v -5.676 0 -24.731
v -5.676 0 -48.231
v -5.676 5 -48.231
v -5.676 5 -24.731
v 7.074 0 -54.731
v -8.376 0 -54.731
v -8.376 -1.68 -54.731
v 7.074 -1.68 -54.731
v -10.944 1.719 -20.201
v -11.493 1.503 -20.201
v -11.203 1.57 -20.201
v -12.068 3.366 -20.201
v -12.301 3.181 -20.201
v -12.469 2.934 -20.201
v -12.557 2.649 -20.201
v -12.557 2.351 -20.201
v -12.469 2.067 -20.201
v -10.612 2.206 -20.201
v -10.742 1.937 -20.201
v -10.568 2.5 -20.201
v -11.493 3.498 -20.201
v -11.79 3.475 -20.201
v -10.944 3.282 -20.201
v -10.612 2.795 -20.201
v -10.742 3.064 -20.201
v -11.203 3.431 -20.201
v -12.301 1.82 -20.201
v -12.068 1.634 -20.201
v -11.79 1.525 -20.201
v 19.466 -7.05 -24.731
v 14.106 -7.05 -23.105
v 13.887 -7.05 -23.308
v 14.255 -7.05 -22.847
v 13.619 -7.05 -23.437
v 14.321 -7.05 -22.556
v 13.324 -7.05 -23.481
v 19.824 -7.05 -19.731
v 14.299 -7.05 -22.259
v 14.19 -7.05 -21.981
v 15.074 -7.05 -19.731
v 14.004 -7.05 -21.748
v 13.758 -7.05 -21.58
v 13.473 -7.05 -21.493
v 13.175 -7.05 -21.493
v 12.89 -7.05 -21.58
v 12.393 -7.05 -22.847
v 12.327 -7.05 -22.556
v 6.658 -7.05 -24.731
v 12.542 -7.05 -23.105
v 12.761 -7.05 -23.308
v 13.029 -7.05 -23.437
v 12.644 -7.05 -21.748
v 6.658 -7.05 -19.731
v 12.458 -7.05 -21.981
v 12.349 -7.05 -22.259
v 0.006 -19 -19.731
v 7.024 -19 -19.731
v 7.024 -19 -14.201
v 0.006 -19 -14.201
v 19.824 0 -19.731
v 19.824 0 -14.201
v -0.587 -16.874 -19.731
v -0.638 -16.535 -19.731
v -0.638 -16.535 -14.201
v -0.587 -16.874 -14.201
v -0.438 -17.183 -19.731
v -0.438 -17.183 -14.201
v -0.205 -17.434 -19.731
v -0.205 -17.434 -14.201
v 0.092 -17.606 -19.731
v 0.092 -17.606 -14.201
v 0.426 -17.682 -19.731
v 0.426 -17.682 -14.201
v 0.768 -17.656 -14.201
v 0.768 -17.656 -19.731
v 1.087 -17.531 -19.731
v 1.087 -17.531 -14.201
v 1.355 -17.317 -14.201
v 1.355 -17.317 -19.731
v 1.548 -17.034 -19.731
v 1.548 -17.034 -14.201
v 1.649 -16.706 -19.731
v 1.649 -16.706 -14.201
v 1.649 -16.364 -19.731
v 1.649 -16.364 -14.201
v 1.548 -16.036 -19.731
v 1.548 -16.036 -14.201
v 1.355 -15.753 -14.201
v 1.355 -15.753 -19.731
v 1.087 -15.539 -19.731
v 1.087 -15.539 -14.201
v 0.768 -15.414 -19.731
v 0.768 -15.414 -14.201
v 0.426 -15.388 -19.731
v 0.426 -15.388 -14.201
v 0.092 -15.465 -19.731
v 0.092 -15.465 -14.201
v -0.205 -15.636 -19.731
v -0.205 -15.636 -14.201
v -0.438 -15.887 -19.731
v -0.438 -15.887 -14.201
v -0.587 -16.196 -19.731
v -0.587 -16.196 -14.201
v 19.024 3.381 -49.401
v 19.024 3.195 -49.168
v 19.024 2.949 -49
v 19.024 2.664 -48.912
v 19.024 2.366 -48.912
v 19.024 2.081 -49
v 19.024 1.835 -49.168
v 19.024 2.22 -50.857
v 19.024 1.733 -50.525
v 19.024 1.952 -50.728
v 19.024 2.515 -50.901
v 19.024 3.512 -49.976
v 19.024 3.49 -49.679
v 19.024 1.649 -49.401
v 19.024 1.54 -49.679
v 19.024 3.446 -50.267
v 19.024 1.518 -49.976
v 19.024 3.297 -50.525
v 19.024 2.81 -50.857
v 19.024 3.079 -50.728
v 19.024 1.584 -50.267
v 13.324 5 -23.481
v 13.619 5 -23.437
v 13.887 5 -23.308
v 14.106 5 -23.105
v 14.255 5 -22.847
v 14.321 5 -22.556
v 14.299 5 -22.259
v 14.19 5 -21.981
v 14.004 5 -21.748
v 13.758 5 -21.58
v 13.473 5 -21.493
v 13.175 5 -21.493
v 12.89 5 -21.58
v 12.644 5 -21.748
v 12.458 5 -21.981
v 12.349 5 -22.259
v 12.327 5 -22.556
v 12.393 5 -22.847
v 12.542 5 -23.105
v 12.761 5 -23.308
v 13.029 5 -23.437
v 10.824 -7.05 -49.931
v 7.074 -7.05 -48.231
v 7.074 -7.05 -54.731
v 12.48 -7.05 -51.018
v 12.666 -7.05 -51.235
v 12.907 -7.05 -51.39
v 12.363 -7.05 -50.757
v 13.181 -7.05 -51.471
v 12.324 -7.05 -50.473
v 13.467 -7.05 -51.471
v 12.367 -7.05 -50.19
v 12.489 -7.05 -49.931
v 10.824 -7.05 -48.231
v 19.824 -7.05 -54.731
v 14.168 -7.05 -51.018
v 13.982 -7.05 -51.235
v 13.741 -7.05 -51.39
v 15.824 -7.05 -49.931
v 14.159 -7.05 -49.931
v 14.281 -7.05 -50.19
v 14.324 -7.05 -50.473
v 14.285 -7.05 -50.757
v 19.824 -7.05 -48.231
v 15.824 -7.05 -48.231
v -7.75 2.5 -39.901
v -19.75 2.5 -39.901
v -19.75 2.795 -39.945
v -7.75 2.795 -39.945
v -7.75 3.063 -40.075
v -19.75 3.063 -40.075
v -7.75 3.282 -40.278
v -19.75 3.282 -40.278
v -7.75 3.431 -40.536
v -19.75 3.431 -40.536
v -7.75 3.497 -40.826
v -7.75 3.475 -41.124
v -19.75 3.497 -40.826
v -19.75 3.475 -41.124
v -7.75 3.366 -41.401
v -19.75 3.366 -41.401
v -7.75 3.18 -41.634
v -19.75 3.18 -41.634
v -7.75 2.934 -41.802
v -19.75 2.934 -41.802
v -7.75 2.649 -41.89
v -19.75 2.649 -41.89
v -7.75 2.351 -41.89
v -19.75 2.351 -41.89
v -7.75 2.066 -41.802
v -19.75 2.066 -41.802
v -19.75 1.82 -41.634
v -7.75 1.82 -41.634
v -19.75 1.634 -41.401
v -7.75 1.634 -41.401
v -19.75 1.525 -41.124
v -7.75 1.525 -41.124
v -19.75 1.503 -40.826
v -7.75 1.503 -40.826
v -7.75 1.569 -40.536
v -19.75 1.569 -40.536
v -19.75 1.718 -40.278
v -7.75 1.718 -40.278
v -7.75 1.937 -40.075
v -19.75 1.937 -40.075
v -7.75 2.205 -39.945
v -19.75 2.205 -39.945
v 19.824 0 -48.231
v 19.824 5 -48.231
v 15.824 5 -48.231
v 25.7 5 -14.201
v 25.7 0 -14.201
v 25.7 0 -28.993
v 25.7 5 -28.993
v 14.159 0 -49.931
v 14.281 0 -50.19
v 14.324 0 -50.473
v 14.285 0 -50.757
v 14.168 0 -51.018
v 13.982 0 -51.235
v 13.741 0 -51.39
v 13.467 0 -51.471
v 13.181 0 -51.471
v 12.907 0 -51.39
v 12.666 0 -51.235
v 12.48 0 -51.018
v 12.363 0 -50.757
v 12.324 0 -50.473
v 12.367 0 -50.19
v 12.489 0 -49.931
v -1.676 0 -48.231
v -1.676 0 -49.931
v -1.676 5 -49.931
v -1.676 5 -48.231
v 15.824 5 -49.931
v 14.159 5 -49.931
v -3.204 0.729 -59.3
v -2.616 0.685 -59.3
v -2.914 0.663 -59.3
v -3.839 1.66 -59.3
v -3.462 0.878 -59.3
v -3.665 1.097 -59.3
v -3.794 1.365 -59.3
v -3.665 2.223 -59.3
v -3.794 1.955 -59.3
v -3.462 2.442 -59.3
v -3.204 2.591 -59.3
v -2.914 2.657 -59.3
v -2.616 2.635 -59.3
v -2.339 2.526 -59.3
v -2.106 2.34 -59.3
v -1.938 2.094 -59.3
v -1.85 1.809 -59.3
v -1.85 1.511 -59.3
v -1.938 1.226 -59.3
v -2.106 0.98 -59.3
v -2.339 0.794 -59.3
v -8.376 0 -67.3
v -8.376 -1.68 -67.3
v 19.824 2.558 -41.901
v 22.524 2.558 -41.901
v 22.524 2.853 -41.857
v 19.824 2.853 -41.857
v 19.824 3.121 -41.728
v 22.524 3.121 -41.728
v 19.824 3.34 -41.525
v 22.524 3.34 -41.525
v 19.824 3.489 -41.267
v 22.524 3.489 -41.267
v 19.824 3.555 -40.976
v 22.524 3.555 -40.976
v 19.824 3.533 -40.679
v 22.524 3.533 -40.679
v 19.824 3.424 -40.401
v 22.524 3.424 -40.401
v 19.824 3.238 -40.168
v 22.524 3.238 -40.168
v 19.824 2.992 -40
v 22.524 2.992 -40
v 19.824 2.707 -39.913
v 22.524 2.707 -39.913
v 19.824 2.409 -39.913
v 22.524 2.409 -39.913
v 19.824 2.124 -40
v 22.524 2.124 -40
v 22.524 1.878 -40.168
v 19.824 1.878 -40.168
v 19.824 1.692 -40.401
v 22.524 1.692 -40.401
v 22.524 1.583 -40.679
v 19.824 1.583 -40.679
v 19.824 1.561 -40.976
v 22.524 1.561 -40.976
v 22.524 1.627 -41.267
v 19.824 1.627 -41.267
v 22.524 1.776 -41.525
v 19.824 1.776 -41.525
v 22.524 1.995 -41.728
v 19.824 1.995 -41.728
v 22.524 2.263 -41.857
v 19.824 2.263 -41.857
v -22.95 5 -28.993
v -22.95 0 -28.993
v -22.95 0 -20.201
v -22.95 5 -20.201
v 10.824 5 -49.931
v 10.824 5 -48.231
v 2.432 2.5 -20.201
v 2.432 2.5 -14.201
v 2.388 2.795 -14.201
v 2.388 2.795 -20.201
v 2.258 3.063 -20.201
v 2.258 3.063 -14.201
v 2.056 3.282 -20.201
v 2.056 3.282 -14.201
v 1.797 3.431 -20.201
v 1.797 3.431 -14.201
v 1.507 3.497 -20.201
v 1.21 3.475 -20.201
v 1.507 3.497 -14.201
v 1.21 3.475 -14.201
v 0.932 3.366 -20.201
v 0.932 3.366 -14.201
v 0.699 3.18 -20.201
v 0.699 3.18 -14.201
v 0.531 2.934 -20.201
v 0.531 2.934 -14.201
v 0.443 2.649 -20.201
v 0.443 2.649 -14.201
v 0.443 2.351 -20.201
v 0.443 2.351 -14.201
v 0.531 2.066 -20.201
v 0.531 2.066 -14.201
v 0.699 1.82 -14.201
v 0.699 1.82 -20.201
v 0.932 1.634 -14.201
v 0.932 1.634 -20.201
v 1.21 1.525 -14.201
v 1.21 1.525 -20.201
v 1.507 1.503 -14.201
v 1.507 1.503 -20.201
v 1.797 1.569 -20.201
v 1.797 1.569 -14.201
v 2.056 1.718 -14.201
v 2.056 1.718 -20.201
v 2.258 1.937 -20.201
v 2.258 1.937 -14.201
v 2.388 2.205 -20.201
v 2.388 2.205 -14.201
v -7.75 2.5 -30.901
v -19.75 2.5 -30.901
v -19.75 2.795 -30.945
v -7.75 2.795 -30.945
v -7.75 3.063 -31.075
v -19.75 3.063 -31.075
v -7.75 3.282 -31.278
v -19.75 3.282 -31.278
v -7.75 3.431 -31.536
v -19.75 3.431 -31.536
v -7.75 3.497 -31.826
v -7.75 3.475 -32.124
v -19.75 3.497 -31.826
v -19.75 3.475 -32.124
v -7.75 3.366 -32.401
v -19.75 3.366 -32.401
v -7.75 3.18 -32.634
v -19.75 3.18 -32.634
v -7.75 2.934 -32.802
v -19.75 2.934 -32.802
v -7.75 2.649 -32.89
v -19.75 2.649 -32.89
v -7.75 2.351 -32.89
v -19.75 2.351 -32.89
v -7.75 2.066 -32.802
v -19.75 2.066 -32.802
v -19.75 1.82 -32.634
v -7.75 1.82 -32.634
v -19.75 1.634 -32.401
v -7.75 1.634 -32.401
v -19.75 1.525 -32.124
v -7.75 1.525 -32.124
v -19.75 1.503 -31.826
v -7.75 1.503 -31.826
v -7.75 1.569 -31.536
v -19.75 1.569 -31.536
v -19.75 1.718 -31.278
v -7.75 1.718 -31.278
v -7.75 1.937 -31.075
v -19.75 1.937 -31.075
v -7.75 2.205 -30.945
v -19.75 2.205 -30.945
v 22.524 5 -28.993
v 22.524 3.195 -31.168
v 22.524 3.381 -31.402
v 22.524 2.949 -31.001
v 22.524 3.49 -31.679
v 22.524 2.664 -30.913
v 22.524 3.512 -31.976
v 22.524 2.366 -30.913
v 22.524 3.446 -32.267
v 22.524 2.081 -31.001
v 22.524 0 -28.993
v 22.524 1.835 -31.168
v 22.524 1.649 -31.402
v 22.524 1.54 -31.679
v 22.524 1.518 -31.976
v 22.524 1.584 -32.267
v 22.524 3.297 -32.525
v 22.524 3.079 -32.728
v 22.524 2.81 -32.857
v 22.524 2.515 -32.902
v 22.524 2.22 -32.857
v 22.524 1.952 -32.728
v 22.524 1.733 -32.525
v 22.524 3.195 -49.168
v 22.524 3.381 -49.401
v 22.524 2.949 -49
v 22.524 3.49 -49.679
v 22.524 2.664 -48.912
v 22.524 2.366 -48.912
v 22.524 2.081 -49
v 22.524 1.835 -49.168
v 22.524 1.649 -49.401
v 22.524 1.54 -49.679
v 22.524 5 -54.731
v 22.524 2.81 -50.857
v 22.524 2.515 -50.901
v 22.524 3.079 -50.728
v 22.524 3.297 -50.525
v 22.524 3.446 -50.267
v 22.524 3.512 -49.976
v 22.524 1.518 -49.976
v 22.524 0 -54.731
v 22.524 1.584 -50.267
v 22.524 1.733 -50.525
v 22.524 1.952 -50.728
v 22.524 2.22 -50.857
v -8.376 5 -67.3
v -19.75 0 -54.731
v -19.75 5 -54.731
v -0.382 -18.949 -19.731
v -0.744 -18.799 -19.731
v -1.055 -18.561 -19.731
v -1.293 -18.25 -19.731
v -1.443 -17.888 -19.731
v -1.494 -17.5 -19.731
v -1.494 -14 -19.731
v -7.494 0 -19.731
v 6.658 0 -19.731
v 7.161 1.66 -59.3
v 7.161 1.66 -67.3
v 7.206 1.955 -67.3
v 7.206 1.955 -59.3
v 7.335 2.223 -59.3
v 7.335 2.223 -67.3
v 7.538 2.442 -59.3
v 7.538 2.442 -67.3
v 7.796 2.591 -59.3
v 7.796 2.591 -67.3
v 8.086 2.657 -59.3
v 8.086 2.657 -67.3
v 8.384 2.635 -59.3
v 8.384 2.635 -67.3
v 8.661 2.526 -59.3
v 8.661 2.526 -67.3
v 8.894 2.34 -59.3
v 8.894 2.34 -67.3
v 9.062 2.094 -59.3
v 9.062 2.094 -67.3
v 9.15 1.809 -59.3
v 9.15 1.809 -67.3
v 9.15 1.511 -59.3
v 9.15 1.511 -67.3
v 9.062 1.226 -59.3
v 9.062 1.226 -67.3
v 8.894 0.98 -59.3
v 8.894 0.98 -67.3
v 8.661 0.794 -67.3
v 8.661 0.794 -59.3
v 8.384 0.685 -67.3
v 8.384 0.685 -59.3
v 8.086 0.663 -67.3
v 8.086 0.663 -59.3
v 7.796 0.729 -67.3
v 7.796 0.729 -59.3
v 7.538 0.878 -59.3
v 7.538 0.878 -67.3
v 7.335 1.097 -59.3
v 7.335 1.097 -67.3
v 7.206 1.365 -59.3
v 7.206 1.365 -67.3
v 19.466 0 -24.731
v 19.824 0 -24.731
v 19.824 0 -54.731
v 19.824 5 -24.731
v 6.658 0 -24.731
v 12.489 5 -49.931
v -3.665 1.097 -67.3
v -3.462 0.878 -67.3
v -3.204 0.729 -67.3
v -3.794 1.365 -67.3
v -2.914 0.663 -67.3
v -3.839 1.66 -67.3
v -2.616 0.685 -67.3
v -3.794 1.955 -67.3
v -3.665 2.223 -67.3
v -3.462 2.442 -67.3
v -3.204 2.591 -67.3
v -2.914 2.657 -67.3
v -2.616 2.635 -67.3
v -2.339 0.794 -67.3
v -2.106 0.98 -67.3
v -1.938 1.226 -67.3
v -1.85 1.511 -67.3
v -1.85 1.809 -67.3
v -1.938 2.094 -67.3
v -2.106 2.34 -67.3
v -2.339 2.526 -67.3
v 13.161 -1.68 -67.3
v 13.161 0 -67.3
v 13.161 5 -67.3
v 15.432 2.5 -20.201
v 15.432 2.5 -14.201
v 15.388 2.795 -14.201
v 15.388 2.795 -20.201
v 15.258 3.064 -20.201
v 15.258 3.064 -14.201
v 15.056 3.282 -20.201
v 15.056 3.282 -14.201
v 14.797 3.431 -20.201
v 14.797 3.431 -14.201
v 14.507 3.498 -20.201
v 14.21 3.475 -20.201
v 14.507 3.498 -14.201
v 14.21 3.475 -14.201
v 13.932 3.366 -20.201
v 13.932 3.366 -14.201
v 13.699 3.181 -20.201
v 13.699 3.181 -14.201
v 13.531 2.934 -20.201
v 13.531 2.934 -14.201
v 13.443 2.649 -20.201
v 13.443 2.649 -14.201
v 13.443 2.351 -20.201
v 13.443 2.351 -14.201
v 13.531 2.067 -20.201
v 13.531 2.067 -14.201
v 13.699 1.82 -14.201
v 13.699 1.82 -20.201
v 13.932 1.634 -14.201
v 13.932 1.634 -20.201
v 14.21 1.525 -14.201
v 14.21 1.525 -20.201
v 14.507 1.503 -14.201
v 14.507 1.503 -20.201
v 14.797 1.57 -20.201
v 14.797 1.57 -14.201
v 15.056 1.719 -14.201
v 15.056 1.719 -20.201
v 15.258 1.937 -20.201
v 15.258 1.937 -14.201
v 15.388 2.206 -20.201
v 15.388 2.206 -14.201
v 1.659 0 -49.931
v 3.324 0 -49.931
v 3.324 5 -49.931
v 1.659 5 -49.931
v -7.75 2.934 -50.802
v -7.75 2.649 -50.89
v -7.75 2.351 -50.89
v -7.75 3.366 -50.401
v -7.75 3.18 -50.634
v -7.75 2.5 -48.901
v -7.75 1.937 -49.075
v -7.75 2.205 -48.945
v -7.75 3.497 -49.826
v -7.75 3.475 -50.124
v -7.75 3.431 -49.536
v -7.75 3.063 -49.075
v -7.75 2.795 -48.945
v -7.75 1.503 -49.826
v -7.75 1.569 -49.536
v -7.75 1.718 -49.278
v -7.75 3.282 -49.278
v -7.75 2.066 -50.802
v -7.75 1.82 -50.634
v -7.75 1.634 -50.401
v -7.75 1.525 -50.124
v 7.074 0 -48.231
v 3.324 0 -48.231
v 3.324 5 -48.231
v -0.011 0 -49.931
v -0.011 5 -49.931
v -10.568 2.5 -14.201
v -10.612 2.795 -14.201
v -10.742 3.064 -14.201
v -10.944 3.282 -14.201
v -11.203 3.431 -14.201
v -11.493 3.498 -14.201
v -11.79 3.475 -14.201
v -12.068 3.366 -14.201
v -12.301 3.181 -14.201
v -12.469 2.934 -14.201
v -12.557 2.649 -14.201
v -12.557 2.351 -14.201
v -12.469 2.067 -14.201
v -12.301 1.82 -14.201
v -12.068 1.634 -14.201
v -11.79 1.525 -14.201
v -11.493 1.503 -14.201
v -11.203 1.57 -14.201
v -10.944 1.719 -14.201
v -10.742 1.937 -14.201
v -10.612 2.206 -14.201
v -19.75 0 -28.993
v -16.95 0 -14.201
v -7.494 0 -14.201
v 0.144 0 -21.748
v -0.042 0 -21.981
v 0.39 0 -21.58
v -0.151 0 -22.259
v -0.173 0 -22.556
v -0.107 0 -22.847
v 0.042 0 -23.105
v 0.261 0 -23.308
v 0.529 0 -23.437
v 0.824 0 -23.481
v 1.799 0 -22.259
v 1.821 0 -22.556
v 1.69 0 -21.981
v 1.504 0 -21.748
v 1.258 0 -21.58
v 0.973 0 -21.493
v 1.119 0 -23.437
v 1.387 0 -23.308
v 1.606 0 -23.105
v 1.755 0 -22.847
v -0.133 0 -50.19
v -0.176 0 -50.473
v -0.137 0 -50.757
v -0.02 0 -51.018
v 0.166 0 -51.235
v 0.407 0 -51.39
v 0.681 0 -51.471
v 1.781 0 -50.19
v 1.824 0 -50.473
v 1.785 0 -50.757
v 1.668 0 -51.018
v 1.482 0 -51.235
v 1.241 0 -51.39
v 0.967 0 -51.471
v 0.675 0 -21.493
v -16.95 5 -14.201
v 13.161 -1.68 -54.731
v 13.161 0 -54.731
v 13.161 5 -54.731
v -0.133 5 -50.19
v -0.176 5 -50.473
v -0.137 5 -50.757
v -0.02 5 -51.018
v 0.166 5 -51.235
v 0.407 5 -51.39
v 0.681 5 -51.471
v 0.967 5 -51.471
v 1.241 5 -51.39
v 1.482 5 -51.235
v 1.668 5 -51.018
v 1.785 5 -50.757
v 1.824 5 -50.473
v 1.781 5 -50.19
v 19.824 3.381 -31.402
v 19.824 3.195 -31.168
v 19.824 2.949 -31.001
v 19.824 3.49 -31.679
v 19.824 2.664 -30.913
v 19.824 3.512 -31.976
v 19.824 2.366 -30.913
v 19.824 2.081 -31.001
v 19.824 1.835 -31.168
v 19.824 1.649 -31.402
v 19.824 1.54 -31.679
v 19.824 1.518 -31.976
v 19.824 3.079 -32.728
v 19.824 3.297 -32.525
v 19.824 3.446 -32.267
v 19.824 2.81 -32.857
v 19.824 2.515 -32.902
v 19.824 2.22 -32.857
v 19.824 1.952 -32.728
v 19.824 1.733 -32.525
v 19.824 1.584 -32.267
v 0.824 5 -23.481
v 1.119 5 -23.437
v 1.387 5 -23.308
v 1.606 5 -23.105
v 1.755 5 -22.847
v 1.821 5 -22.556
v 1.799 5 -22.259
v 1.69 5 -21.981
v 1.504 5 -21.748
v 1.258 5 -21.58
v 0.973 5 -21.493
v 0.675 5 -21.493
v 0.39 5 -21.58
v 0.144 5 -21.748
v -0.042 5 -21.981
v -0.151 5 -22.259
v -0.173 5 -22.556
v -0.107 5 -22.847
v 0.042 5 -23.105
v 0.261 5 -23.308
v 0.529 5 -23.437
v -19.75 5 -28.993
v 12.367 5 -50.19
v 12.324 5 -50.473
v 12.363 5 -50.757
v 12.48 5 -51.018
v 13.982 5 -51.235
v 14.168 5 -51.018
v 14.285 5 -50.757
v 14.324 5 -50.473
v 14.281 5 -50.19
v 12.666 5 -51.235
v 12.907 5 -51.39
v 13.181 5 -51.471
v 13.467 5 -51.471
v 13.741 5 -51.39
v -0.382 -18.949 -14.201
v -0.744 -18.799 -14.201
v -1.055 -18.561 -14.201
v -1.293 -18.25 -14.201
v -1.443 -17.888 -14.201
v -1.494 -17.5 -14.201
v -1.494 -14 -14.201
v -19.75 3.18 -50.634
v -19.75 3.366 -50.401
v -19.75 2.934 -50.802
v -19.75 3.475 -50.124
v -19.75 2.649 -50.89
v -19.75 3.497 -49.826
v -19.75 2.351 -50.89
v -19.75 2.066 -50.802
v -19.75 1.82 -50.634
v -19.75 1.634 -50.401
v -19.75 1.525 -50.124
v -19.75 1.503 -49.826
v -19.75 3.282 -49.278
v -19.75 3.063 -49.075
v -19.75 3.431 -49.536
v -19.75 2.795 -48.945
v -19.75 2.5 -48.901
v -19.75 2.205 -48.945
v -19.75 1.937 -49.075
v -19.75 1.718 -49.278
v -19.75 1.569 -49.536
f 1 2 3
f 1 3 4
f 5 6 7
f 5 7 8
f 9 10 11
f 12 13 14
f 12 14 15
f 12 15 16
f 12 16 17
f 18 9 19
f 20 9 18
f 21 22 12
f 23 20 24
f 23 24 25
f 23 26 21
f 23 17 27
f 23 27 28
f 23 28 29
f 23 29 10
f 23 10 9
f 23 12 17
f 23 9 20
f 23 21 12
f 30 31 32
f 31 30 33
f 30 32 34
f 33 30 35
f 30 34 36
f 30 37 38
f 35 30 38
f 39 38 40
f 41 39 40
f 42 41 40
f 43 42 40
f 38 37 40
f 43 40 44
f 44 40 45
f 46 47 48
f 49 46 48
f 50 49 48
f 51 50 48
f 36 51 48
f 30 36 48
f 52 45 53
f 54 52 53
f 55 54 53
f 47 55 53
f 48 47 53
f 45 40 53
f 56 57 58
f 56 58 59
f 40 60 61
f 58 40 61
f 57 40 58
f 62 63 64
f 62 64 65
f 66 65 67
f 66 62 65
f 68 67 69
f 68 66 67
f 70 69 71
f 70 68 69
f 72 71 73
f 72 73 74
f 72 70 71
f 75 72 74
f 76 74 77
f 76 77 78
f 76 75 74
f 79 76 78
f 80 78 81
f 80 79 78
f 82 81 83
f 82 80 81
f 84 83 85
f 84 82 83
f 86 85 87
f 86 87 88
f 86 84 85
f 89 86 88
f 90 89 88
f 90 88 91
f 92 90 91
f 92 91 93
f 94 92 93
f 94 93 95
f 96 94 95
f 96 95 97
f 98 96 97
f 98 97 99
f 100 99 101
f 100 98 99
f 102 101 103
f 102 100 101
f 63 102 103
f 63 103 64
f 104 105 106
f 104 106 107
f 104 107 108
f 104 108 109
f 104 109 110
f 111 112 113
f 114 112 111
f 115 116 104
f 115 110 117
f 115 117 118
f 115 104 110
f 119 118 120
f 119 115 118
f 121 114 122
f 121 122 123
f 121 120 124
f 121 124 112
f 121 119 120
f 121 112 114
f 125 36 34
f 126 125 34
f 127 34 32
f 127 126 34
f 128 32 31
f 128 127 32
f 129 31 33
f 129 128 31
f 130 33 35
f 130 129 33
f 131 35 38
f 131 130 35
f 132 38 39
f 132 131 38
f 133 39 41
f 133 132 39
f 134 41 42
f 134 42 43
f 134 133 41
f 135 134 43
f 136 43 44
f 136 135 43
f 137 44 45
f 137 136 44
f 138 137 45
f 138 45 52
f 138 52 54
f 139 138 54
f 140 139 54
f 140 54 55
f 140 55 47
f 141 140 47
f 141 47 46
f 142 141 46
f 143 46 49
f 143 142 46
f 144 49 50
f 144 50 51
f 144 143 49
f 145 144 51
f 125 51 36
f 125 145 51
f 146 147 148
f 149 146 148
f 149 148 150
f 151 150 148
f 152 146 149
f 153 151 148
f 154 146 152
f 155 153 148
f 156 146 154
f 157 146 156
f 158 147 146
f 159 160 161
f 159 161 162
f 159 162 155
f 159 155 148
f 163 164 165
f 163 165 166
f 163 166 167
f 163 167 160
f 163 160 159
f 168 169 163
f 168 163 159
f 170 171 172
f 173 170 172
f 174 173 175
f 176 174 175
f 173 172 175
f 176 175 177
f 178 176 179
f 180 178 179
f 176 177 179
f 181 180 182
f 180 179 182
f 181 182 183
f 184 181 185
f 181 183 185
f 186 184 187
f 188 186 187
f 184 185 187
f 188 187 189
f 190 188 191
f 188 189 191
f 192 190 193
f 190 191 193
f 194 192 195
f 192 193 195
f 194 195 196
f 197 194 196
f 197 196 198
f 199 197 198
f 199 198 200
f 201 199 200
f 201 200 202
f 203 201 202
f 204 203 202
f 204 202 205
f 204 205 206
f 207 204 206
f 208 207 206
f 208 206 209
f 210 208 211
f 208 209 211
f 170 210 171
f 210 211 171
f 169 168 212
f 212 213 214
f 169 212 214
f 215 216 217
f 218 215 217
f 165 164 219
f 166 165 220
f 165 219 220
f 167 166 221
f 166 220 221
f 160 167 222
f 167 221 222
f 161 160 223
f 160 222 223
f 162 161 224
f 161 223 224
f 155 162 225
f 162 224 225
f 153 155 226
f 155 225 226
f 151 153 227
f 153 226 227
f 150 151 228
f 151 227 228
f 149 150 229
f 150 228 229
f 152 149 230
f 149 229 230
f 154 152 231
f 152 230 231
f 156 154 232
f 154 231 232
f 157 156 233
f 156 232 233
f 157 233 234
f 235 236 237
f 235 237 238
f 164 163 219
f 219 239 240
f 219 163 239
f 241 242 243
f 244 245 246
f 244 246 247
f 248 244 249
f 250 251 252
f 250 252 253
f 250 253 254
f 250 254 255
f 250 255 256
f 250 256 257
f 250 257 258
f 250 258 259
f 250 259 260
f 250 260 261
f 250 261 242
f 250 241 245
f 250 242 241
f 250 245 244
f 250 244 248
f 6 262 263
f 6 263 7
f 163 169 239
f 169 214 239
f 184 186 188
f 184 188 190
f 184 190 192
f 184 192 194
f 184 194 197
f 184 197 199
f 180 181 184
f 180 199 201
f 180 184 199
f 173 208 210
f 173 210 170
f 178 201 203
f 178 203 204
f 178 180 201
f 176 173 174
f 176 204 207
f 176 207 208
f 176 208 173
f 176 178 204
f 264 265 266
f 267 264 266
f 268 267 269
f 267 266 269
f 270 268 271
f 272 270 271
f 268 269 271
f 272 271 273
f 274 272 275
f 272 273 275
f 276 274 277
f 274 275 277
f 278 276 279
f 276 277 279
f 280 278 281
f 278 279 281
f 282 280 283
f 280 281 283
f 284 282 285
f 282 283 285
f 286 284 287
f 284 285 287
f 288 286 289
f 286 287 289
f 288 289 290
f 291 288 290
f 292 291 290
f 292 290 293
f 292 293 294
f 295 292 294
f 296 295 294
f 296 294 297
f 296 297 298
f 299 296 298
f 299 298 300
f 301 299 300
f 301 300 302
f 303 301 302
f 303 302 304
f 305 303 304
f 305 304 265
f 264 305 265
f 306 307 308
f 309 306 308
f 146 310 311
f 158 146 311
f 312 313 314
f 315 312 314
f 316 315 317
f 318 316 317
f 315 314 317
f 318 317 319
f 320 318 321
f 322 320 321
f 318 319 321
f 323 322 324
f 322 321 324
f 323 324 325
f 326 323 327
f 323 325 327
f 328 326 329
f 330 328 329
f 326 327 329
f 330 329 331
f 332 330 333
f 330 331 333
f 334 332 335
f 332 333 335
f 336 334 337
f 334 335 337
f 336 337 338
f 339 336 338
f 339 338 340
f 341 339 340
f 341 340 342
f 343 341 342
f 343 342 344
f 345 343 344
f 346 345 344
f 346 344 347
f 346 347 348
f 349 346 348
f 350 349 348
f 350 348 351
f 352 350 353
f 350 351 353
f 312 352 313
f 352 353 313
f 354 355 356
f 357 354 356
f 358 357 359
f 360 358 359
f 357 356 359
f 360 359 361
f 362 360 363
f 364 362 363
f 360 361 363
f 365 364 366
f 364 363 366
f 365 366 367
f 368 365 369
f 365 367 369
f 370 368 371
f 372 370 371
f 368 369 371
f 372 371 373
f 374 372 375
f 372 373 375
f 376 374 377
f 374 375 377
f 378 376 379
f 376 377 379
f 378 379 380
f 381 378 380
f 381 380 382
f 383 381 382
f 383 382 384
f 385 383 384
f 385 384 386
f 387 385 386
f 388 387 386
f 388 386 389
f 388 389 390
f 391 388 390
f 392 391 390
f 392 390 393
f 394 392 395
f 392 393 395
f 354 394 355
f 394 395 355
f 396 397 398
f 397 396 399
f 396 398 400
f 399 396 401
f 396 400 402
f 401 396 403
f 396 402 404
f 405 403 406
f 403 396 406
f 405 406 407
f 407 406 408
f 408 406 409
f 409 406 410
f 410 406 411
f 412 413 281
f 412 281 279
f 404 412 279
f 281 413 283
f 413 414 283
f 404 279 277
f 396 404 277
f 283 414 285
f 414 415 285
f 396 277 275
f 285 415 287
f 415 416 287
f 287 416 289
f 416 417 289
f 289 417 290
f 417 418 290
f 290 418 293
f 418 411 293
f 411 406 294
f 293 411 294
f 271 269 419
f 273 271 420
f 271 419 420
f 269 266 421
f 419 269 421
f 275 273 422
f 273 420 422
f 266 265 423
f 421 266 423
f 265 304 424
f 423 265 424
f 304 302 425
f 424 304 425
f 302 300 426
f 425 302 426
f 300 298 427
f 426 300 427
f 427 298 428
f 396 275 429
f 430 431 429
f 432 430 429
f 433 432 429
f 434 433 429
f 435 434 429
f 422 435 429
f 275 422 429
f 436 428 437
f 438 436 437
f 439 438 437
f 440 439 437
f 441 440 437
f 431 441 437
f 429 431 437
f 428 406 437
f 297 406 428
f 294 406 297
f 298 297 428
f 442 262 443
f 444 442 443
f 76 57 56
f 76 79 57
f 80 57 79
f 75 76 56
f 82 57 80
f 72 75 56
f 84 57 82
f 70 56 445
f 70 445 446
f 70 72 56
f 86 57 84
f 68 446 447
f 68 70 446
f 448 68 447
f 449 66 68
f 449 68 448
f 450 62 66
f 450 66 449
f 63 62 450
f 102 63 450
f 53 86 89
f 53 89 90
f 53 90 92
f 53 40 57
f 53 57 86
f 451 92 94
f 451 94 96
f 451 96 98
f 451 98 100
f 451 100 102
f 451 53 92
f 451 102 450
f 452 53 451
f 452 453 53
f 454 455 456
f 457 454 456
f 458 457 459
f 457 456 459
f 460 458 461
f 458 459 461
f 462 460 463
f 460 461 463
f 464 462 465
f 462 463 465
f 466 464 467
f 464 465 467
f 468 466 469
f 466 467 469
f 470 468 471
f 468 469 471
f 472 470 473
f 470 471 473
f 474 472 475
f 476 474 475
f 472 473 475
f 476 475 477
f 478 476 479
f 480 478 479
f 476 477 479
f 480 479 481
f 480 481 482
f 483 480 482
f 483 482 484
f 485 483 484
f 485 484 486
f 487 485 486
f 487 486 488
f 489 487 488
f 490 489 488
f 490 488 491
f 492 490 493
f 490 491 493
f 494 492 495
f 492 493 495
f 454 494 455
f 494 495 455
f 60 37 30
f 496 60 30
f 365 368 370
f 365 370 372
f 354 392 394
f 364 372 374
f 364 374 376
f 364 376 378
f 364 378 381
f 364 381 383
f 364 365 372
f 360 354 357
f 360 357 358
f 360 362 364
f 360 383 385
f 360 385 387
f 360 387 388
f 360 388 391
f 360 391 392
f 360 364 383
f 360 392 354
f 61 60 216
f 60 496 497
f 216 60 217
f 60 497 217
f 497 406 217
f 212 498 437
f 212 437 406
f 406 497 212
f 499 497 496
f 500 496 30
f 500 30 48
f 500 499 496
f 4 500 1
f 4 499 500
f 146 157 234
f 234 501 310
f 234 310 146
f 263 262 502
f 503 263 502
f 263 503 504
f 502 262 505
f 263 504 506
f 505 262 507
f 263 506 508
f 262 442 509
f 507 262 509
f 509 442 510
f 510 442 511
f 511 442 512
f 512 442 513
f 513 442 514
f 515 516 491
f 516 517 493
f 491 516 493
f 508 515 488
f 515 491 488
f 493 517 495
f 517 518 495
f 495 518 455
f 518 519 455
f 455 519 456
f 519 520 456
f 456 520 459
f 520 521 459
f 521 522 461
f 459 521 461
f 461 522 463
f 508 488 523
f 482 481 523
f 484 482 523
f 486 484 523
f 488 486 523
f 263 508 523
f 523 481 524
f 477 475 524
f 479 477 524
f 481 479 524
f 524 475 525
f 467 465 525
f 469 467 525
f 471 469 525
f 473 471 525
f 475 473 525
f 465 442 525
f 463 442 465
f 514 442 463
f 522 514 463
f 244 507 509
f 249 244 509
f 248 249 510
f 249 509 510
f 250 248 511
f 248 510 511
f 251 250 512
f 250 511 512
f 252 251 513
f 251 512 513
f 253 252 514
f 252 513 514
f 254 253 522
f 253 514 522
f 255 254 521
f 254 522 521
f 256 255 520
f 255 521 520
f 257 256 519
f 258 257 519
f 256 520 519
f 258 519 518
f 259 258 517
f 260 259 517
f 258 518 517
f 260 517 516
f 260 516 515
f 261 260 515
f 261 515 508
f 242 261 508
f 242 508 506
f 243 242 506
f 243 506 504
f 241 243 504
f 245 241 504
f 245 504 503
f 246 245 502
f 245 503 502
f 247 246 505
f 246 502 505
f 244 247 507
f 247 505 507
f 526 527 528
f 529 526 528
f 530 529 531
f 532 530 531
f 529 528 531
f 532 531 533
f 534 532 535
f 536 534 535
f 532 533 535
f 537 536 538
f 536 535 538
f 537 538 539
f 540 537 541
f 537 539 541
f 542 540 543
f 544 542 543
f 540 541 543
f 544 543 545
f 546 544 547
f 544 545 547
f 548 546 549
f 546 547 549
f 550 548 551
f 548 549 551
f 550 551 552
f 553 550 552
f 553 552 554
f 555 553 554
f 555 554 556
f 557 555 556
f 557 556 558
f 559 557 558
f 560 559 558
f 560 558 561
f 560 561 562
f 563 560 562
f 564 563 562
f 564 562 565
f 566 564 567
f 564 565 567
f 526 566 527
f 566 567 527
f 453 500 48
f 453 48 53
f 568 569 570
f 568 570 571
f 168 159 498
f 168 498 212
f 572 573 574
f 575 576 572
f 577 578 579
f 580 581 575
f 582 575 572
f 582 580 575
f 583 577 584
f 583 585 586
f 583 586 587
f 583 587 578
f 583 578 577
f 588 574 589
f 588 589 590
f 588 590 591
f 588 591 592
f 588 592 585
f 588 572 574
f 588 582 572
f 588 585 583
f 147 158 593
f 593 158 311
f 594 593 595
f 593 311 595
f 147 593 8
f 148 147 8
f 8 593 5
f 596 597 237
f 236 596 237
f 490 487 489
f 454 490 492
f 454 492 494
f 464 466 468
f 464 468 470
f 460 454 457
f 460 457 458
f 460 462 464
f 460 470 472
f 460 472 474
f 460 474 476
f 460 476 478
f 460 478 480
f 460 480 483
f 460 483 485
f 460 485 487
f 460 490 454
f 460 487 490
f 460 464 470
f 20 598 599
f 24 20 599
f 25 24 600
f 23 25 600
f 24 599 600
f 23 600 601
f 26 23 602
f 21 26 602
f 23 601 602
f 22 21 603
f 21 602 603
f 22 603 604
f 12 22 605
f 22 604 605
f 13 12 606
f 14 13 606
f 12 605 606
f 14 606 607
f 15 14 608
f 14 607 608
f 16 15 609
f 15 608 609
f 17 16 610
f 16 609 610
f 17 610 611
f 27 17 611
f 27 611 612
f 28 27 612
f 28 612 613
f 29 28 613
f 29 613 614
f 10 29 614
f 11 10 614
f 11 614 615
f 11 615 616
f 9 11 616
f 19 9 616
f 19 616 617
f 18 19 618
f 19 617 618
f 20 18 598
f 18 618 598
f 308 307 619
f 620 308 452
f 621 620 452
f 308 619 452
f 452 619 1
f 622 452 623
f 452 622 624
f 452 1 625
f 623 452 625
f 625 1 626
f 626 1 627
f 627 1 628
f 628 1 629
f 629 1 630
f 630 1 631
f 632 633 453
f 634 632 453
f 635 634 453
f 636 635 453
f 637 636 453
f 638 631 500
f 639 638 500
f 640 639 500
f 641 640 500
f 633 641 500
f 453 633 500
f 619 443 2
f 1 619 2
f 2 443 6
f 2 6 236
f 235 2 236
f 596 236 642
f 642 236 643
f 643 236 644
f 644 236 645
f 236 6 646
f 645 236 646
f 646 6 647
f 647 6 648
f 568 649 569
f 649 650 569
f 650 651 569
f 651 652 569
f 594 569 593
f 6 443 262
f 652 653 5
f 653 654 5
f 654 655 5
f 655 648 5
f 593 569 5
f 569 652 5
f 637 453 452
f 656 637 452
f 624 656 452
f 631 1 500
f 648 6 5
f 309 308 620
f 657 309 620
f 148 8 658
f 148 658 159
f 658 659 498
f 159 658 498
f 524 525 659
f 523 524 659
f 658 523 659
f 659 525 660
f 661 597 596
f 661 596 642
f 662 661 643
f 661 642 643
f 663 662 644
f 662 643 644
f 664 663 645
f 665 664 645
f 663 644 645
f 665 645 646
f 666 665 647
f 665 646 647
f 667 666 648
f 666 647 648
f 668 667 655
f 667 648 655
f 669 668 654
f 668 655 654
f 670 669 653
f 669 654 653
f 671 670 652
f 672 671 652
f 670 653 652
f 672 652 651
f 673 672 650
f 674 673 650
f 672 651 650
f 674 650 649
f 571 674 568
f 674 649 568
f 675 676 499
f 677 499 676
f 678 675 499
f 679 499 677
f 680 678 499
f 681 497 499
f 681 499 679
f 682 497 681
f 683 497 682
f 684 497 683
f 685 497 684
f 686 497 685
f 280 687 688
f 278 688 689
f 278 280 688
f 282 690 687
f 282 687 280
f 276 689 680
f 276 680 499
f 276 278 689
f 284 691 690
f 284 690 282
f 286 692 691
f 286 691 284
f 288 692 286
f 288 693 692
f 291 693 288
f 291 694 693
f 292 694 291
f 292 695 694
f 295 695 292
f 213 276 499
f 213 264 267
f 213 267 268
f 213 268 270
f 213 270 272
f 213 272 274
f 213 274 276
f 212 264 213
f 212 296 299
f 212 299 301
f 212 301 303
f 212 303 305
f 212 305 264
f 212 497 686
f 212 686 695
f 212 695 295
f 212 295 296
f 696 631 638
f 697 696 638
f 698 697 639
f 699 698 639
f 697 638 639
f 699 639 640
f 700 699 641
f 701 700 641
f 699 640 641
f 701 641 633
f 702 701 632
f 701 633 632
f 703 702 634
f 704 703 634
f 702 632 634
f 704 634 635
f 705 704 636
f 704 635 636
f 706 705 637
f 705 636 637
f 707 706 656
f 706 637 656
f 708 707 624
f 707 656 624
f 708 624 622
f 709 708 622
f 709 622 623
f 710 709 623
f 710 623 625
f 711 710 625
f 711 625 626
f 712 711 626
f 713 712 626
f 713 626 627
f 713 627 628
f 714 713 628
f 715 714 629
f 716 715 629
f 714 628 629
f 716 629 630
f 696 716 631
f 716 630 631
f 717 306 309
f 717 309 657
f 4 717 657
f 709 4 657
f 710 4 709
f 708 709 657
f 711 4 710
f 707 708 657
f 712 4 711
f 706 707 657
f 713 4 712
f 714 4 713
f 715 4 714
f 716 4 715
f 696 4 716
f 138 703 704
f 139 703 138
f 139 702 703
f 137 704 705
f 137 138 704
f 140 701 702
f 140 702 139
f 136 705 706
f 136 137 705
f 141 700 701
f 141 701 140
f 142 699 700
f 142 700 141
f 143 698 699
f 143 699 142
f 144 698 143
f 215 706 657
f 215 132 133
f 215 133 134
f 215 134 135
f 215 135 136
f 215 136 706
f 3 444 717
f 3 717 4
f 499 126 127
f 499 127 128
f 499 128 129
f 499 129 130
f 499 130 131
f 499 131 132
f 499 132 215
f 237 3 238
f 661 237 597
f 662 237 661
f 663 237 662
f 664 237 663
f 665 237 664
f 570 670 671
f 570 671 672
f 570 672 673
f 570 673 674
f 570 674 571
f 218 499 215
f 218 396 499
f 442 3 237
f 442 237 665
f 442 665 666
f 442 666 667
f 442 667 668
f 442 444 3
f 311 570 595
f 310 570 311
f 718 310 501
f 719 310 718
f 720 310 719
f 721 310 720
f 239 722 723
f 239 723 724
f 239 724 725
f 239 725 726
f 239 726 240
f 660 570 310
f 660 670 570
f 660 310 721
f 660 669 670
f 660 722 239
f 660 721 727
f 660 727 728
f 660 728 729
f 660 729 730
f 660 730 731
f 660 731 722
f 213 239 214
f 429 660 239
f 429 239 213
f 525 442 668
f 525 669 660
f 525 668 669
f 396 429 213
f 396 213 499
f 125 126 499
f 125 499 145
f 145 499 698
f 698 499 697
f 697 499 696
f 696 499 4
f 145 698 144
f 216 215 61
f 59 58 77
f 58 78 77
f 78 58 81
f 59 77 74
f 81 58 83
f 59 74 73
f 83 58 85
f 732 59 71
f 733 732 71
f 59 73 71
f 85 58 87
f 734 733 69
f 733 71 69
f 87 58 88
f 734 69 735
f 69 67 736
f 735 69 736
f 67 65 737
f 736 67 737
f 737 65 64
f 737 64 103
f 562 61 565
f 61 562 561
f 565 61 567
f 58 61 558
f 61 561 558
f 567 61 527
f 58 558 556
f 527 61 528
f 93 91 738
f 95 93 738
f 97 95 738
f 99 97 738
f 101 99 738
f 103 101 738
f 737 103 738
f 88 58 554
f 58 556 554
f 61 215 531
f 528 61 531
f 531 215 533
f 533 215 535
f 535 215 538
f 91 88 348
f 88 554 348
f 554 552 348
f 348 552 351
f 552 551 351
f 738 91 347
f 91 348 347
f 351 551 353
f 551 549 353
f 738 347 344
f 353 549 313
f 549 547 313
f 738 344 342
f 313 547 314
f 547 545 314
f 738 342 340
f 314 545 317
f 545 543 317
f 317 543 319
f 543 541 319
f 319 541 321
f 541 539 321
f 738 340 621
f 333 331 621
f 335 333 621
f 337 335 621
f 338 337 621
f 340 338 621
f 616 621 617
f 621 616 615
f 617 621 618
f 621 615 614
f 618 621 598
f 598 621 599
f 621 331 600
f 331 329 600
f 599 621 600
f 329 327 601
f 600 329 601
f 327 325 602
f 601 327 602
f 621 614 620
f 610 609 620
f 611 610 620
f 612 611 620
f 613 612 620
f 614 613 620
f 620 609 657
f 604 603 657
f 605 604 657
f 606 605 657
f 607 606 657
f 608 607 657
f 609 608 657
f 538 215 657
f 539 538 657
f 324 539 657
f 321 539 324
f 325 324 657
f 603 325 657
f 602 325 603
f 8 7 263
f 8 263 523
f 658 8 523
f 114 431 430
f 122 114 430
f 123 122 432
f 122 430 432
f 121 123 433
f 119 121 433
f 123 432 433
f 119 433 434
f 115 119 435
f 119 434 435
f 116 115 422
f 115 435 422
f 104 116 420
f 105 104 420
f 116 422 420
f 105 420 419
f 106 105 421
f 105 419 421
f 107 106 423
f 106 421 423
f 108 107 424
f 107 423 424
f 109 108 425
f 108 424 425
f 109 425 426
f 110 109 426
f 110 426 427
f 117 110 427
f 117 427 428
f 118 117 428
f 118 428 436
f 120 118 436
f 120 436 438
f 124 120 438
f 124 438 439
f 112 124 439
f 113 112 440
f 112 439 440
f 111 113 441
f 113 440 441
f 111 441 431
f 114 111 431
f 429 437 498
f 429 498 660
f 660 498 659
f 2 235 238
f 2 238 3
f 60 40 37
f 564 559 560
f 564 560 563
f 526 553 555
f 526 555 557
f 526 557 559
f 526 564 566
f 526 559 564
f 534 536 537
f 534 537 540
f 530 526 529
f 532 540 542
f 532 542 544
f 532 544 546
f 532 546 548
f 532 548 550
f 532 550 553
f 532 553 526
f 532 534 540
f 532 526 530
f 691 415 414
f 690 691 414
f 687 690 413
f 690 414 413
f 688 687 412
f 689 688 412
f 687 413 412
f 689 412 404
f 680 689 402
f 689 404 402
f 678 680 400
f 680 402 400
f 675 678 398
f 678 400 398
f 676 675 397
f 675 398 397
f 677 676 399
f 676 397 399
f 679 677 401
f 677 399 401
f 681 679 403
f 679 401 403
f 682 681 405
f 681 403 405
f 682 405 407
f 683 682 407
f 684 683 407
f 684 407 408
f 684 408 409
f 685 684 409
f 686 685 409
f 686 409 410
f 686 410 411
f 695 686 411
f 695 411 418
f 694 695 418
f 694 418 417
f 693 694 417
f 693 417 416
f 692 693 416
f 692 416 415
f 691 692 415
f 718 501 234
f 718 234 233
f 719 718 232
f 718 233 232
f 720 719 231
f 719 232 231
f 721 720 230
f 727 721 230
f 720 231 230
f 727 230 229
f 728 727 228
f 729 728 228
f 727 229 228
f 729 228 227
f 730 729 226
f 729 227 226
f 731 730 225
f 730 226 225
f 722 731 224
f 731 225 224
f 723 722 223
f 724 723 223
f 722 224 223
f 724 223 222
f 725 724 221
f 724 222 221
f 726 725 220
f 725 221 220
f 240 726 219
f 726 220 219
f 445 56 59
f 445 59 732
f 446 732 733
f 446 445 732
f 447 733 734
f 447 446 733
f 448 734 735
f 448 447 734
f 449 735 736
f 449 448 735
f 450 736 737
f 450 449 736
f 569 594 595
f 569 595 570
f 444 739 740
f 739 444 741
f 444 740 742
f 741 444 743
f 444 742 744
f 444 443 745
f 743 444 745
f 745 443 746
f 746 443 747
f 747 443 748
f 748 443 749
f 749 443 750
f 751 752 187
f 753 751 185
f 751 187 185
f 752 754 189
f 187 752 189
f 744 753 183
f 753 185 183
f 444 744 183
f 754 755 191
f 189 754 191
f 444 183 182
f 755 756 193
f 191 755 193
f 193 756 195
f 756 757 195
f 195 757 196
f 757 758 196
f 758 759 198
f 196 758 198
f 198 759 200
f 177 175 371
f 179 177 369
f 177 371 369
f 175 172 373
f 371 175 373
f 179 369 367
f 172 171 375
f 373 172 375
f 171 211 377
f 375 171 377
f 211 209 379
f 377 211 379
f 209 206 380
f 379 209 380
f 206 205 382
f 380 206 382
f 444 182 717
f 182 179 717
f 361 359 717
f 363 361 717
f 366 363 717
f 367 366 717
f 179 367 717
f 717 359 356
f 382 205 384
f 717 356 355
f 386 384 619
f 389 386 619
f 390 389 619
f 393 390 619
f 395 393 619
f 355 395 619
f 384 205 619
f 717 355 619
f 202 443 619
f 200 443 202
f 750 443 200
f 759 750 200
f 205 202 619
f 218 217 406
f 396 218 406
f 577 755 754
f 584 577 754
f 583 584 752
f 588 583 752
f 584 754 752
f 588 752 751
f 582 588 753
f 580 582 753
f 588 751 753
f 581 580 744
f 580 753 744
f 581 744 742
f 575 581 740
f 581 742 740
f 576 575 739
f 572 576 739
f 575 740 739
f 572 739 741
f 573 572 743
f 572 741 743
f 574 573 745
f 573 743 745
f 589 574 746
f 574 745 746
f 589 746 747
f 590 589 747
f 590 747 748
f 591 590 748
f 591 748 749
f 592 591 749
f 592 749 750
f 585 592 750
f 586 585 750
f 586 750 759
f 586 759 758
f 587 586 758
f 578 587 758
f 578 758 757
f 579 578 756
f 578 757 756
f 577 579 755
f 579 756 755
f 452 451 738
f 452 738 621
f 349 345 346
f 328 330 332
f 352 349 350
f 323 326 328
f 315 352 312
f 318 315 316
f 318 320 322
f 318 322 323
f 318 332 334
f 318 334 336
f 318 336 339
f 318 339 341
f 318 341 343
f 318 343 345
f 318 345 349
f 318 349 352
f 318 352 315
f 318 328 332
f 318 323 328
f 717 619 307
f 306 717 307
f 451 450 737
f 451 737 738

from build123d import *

# Parameters (mm, degrees)
EXTRUDE_1_DEPTH     = 5
SKETCH_4_R          = 0.999999968
SKETCH_4_R_2        = 1.000000188
CUT_EXTRUDE_1_DEPTH = 5
SKETCH_6_R          = 1.000000276
SKETCH_6_R_2        = 0.999999818
CUT_EXTRUDE_2_DEPTH = 5
SKETCH_13_R         = 1.000000021
SKETCH_13_R_2       = 0.999999728
SKETCH_13_R_3       = 0.999999832
CUT_EXTRUDE_3_DEPTH = 6
SKETCH_18_R         = 1.000000534
SKETCH_18_R_2       = 1.000000046
SKETCH_18_R_3       = 0.999998785
CUT_EXTRUDE_5_DEPTH = 3.5
SKETCH_23_R         = 0.999998521
SKETCH_23_R_2       = 0.99999884
SKETCH_23_R_3       = 0.999998599
CUT_EXTRUDE_7_DEPTH = 12
EXTRUDE_5_DEPTH     = 7.05
SKETCH_26_R         = 1.000000188
EXTRUDE_5_2_DEPTH   = 7.05
SKETCH_27_W         = 21.53717804
SKETCH_27_H         = 12.569114685
EXTRUDE_6_DEPTH     = 1.68
SKETCH_28_R         = 1
CUT_EXTRUDE_8_DEPTH = 8
SKETCH_29_R         = 1.149999964
EXTRUDE_7_DEPTH     = 5.530267715


with BuildPart() as part:
    # 草图2 → 凸台-拉伸1 (new body)
    with BuildSketch(Plane(origin=(0, 0, 0), x_dir=(1, 0, 0), z_dir=(0, 1, 0))):
        Polygon((-16.950000763, 14.201086044), (25.699960709, 14.201086044), (25.699960709, 28.992816925), (22.523960114, 28.992816925), (22.523960114, 54.730998993), (13.161137581, 54.730880737), (13.161137581, 67.299995422), (-8.376040459, 67.299995422), (-19.75, 54.730998993), (-19.75, 28.992816925), (-22.950000763, 28.992816925), (-22.950000763, 20.201086044), align=None)
    extrude(amount=EXTRUDE_1_DEPTH)

    # 草图4 → 切除-拉伸1 (cut)
    with BuildSketch(Plane.XZ):
        with Locations(Location((0.823959914, -22.48135431, 0), (0, 0, 270))):
            Circle(SKETCH_4_R)
        with Locations(Location((13.323959603, -22.481354784, 0), (0, 0, 270))):
            Circle(SKETCH_4_R_2)
        Polygon((-5.676040173, -24.73135376), (19.823959351, -24.73135376), (19.823959351, -48.23135376), (15.823960304, -48.23135376), (15.823960304, -49.931354523), (10.823960304, -49.931354523), (10.823960304, -48.23135376), (3.323960066, -48.23135376), (3.323960066, -49.931354523), (-1.676040053, -49.931354523), (-1.676040053, -48.23135376), (-5.676040173, -48.23135376), align=None)
    extrude(amount=-CUT_EXTRUDE_1_DEPTH, mode=Mode.SUBTRACT)

    # 草图6 → 切除-拉伸2 (cut)
    with BuildSketch(Plane.XZ):
        with Locations((0.823959833, -50.481354106)):
            Circle(SKETCH_6_R)
        with Locations((13.323959879, -50.481354301)):
            Circle(SKETCH_6_R_2)
    extrude(amount=-CUT_EXTRUDE_2_DEPTH, mode=Mode.SUBTRACT)

    # 草图13 → 切除-拉伸3 (cut)
    with BuildSketch(Plane.XY.offset(-14.201086044)):
        with Locations((1.43202298, 2.499998854)):
            Circle(SKETCH_13_R)
        with Locations((14.432022776, 2.500426737)):
            Circle(SKETCH_13_R_2)
        with Locations((-11.56797721, 2.500425343)):
            Circle(SKETCH_13_R_3)
    extrude(amount=-CUT_EXTRUDE_3_DEPTH, mode=Mode.SUBTRACT)

    # 草图18 → 切除-拉伸5 (cut)
    with BuildSketch(Plane(origin=(22.523960114, 0, 0), x_dir=(0, 0, -1), z_dir=(1, 0, 0))):
        with Locations((31.901501235, 2.515246467)):
            Circle(SKETCH_18_R)
        with Locations((40.901397751, 2.558118146)):
            Circle(SKETCH_18_R_2)
        with Locations((49.901297308, 2.515242677)):
            Circle(SKETCH_18_R_3)
    extrude(amount=-CUT_EXTRUDE_5_DEPTH, mode=Mode.SUBTRACT)

    # 草图23 → 切除-拉伸7 (cut)
    with BuildSketch(Plane.ZY.offset(19.75)):
        with Locations((-31.900998993, 2.5)):
            Circle(SKETCH_23_R)
        with Locations((-40.900998993, 2.5)):
            Circle(SKETCH_23_R_2)
        with Locations((-49.900998993, 2.5)):
            Circle(SKETCH_23_R_3)
    extrude(amount=-CUT_EXTRUDE_7_DEPTH, mode=Mode.SUBTRACT)



with BuildPart() as body_2:
    # 草图26 → 凸台-拉伸5 (new body)
    with BuildSketch(Plane.XZ):
        with BuildLine():
            Line((7.073960185, -48.23135376), (7.073960185, -54.730880737))
            Line((7.073960185, -54.730880737), (19.823959351, -54.730964891))
            Line((19.823959351, -54.730964891), (19.823959351, -48.23135376))
            Line((19.823959351, -48.23135376), (15.823960304, -48.23135376))
            Line((15.823960304, -48.23135376), (15.823960304, -49.931354523))
            Line((15.823960304, -49.931354523), (14.159124462, -49.931354523))
            ThreePointArc((14.159124462, -49.931354523), (13.323959879, -51.481354119), (12.488795296, -49.931354523))
            Line((12.488795296, -49.931354523), (10.823960304, -49.931354523))
            Line((10.823960304, -49.931354523), (10.823960304, -48.23135376))
            Line((10.823960304, -48.23135376), (7.073960185, -48.23135376))
        make_face()
    extrude(amount=EXTRUDE_5_DEPTH)


with BuildPart() as body_3:
    # 草图26 → Extrude 5 2 (new body)
    with BuildSketch(Plane.XZ):
        Polygon((6.658313635, -24.73135376), (6.658313635, -19.73135376), (19.823959351, -19.73135376), (19.466256946, -24.73135376), align=None)
        with Locations(Location((13.323959603, -22.481354784, 0), (0, 0, 270))):
            Circle(SKETCH_26_R, mode=Mode.SUBTRACT)
    extrude(amount=EXTRUDE_5_2_DEPTH)


with BuildPart() as part_1:
    add(part.part)

    add(body_2.part)  # 凸台-拉伸6 merges body 2
    # 草图27 → 凸台-拉伸6 (add)
    with BuildSketch(Plane.XZ):
        with Locations((2.392548561, -61.01543808)):
            Rectangle(SKETCH_27_W, SKETCH_27_H)
    extrude(amount=EXTRUDE_6_DEPTH)

    # 草图28 → 切除-拉伸8 (cut)
    with BuildSketch(Plane(origin=(0, 0, -67.299995422), x_dir=(-1, 0, 0), z_dir=(0, 0, -1))):
        with Locations((-8.161137581, 1.66)):
            Circle(SKETCH_28_R)
        with Locations((2.838862419, 1.66)):
            Circle(SKETCH_28_R)
    extrude(amount=-CUT_EXTRUDE_8_DEPTH, mode=Mode.SUBTRACT)


    add(body_3.part)  # 凸台-拉伸7 merges body 3
    # 草图29 → 凸台-拉伸7 (add)
    with BuildSketch(Plane.XY.offset(-19.73135376)):
        with BuildLine():
            Line((-7.494005203, 0), (19.823959351, 0))
            Line((19.823959351, 0), (7.023960114, -18.999999285))
            Line((7.023960114, -18.999999285), (0.005995274, -18.999999285))
            ThreePointArc((0.005995274, -18.999999285), (-1.054664898, -18.560659457), (-1.494004726, -17.499999285))
            Line((-1.494004726, -17.499999285), (-1.494004726, -13.999999523))
            Line((-1.494004726, -13.999999523), (-7.494005203, 0))
        make_face()
        with Locations(Location((0.512218449, -16.535050796, 0), (0, 0, 180))):
            Circle(SKETCH_29_R, mode=Mode.SUBTRACT)
    extrude(amount=EXTRUDE_7_DEPTH)


solid = part_1.part
